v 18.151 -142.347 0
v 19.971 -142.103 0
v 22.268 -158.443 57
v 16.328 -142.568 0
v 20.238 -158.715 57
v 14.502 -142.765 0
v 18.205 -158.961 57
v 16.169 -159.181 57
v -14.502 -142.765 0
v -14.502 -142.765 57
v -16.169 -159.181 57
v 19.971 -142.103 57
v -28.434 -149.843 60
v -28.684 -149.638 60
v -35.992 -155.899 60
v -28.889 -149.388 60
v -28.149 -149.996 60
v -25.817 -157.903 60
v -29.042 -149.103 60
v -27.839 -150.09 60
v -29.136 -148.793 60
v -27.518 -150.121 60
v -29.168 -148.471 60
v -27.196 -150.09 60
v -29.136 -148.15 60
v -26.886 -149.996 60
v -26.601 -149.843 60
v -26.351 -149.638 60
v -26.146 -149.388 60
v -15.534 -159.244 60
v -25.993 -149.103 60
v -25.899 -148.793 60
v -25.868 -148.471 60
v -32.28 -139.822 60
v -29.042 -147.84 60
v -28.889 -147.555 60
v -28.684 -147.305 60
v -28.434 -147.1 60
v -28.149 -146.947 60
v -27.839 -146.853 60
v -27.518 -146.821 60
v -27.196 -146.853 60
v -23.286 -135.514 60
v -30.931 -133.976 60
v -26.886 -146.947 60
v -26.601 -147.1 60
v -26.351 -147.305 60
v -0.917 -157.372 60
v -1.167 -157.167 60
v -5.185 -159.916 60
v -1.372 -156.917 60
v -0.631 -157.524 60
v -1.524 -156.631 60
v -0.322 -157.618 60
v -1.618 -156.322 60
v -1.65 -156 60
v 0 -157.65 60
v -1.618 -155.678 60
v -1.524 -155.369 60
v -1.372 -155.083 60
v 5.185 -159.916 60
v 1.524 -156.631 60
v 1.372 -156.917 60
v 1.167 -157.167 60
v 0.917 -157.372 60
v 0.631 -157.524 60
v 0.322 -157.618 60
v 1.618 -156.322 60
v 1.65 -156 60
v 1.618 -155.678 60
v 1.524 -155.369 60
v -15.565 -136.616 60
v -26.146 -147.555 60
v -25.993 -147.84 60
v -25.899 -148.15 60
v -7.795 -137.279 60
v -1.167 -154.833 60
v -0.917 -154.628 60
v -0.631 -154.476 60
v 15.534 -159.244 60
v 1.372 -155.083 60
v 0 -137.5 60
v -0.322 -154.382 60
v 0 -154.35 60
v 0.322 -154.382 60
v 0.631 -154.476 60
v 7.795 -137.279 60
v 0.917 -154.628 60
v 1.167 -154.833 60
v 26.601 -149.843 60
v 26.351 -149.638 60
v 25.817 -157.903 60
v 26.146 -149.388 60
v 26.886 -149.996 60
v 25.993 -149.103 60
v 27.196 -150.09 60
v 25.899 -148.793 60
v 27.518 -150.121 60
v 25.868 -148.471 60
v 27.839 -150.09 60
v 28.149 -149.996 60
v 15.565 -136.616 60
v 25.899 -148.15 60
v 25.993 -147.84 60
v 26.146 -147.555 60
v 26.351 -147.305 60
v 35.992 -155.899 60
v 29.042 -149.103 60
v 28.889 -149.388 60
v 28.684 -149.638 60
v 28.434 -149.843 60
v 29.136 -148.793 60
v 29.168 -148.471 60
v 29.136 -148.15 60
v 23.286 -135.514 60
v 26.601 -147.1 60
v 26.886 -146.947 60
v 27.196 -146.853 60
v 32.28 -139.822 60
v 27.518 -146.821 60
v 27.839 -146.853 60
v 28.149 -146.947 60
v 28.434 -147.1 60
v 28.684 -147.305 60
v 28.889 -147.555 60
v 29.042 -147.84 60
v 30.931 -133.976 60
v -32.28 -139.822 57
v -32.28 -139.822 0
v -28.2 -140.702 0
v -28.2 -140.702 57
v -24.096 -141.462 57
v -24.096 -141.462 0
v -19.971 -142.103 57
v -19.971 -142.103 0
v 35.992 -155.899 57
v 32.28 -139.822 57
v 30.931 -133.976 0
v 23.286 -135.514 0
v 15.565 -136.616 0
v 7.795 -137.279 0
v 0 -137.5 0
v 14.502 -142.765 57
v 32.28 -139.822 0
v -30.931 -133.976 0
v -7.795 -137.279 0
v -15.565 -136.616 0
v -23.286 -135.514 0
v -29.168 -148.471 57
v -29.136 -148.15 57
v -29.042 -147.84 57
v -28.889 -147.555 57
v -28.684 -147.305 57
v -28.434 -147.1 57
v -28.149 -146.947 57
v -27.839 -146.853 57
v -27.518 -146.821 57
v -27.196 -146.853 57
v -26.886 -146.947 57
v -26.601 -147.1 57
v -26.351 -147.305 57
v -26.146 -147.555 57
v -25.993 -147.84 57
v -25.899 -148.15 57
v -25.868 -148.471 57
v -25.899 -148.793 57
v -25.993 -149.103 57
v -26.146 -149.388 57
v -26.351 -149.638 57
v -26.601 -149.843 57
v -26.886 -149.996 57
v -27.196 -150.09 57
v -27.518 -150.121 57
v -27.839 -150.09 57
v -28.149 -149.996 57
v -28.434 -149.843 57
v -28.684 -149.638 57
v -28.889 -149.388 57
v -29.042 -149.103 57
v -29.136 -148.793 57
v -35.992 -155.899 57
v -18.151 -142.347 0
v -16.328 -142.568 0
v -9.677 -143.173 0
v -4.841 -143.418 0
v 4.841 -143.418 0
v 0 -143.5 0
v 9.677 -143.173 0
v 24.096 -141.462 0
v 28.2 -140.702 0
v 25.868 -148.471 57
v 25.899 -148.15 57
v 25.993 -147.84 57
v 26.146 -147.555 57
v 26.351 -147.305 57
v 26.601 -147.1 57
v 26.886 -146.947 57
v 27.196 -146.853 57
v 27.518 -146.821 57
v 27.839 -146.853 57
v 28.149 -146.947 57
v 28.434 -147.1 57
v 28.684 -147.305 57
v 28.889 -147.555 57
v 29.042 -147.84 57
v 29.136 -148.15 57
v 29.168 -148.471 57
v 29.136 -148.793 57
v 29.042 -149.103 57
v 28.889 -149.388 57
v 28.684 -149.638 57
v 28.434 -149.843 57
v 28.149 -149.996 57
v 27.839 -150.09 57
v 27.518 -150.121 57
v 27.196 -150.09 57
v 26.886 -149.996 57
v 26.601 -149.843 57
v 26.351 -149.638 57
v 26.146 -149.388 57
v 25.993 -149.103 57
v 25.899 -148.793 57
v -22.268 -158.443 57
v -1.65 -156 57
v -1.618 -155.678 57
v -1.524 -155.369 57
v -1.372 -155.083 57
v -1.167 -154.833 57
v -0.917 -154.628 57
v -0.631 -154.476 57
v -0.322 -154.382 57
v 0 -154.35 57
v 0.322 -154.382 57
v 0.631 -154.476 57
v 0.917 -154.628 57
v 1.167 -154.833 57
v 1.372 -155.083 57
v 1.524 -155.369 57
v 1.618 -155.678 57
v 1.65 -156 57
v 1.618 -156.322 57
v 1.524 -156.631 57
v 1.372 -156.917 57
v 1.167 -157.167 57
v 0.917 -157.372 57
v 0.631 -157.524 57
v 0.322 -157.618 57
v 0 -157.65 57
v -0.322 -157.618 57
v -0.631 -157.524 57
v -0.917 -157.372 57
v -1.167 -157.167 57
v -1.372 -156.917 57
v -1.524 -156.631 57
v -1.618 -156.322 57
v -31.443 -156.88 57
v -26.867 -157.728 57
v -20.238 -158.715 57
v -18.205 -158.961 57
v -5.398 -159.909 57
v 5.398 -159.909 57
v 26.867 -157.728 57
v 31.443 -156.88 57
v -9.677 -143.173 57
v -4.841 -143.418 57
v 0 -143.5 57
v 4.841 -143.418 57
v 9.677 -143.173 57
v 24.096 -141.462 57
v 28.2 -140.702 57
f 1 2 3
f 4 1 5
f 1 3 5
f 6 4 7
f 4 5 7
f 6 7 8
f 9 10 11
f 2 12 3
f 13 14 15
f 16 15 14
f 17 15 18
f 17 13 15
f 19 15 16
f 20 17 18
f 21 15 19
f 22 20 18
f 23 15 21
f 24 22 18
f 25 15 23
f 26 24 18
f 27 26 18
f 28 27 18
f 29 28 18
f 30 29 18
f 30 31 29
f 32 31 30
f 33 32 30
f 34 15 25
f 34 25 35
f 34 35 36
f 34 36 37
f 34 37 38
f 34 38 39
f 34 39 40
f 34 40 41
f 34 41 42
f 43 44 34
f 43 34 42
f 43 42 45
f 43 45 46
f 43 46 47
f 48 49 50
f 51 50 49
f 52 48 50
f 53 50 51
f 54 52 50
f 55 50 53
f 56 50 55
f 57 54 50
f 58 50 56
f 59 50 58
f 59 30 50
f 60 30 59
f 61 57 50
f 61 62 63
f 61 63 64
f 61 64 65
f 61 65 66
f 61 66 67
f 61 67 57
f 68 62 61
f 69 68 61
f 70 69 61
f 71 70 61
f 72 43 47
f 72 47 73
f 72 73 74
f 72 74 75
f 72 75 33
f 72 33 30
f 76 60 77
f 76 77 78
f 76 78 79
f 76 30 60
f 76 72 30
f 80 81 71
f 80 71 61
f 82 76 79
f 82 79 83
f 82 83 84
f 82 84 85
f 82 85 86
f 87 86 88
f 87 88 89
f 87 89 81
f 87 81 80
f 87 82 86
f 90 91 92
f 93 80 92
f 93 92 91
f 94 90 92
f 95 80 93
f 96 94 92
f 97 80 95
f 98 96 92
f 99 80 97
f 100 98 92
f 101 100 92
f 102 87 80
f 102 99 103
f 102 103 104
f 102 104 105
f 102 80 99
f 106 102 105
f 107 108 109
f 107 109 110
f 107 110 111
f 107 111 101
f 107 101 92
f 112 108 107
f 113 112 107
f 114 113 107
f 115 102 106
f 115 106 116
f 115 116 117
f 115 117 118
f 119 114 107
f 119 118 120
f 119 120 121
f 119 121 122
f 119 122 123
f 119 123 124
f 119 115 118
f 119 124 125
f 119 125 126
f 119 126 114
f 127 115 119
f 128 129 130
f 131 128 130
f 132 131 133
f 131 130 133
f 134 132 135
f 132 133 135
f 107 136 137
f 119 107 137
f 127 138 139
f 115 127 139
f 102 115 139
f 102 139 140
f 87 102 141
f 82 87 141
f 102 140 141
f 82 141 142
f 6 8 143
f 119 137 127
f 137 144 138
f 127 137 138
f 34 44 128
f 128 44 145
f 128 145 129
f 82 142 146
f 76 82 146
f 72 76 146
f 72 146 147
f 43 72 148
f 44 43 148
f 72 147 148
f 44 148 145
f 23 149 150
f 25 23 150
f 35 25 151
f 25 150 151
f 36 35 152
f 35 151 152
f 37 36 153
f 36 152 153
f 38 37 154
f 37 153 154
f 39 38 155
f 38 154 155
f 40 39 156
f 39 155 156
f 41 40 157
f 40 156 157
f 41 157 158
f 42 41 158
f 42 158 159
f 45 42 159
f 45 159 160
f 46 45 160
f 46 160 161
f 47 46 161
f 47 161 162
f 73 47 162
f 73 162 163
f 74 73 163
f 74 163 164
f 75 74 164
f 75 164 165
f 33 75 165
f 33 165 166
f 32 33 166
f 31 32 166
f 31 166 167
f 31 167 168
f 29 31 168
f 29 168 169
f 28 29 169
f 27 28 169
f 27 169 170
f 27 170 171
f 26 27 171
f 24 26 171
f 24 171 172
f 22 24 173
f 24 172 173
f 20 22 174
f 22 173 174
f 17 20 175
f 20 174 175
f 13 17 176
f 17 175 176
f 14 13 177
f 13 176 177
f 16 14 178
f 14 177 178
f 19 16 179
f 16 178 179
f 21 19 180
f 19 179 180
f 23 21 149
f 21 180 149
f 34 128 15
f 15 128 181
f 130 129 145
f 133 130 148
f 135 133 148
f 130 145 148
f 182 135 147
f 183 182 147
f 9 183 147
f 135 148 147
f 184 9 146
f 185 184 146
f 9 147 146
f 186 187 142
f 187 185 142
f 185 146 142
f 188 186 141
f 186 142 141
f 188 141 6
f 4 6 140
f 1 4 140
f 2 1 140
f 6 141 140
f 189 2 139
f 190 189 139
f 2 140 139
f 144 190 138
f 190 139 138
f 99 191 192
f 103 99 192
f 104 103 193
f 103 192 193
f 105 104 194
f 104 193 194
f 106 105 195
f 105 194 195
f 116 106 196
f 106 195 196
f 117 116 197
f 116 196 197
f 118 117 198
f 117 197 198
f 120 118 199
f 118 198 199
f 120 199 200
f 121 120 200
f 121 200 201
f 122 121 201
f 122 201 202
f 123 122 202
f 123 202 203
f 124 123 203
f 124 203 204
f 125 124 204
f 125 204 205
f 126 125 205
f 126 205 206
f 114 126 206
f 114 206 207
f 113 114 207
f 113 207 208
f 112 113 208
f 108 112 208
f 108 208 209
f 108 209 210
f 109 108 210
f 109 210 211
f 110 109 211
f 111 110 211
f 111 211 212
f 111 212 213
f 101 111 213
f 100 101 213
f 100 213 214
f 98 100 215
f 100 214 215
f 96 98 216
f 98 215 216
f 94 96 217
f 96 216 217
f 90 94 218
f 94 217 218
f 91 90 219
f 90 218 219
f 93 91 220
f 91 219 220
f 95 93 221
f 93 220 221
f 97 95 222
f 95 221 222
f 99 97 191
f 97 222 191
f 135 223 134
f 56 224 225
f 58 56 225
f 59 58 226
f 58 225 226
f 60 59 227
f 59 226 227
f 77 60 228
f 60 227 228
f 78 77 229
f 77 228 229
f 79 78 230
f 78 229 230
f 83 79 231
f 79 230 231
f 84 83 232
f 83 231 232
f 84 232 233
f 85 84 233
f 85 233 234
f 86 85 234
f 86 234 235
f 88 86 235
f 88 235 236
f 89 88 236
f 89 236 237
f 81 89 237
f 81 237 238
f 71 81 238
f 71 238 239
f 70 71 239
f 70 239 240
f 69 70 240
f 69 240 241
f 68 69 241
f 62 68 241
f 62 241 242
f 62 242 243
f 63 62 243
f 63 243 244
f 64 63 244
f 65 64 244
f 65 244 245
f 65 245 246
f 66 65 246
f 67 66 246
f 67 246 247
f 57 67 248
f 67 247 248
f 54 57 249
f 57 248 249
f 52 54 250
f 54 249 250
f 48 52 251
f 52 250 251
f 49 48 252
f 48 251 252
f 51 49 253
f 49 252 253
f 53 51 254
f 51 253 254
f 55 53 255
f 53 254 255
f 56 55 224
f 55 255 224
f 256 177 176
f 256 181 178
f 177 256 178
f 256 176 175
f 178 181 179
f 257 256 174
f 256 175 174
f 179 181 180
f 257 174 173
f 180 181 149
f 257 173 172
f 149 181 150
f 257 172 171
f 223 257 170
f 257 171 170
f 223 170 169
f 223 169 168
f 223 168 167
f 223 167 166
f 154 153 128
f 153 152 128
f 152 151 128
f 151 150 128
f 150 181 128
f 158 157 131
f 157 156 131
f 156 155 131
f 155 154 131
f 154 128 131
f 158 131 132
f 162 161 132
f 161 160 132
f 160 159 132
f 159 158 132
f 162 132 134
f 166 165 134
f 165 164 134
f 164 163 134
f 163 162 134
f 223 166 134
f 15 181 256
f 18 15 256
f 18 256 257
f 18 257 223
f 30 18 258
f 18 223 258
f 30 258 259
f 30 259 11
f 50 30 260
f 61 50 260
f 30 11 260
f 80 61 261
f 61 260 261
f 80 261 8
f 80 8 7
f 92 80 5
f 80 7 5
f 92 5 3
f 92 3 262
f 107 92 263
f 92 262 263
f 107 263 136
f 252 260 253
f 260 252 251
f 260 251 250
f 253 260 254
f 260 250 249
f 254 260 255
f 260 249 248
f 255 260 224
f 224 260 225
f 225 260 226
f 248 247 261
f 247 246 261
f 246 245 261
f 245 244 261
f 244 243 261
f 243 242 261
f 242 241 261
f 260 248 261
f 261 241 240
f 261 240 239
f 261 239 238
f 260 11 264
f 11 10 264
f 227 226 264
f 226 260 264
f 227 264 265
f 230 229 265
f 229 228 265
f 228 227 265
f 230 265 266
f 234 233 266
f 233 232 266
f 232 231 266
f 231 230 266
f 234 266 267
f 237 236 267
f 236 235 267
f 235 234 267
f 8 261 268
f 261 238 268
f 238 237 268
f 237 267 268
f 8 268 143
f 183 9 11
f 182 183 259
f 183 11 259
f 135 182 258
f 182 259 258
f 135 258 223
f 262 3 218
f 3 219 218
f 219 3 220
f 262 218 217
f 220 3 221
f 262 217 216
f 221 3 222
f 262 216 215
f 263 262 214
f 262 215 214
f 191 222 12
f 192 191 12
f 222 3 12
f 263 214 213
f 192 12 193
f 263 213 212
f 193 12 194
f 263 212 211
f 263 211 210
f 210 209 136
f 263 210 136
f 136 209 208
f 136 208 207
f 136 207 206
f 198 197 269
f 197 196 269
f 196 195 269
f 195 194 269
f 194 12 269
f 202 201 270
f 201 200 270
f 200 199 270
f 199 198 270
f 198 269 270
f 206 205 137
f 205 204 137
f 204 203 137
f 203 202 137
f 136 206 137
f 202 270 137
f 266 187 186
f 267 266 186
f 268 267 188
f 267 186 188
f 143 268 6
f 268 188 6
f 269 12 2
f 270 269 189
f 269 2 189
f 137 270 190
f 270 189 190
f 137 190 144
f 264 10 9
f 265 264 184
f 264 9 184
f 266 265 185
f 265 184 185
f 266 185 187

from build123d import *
from build123d.topology import SkipClean

# Parameters (mm, degrees)
EXTRUDE_1_DEPTH     = 60
EXTRUDE_START       = -3
EXTRUDE_2_DEPTH     = 3
EXTRUDE_START_2     = 57
SKETCH_3_R          = 1.65
EXTRUDE_3_DEPTH     = 57
SKETCH_4_R          = 1.65
CUT_EXTRUDE_1_DEPTH = 175.629425377


with BuildPart() as part:
    # 草图1 → 凸台-拉伸1 (new body)
    with BuildSketch(Plane.XY):
        with BuildLine():
            ThreePointArc((0, -143.5), (16.244661176, -142.57756129), (32.280476298, -139.822104297))
            Line((32.280476298, -139.822104297), (30.930769972, -133.975883908))
            ThreePointArc((30.930769972, -133.975883908), (15.565441893, -136.616130156), (0, -137.5))
            Line((0, -137.5), (0, -143.5))
        make_face()
        with BuildLine():
            Line((-30.930769972, -133.975883908), (-32.280476298, -139.822104297))
            ThreePointArc((-32.280476298, -139.822104297), (-16.244661176, -142.57756129), (0, -143.5))
            Line((0, -143.5), (0, -137.5))
            ThreePointArc((0, -137.5), (-15.565441893, -136.616130156), (-30.930769972, -133.975883908))
        make_face()
    extrude(amount=EXTRUDE_1_DEPTH)

    # 草图2 → 凸台-拉伸2 (add)
    with BuildSketch(Plane.XY.offset(60).offset(EXTRUDE_START)):
        with BuildLine():
            Line((35.992168695, -155.899210366), (32.280476298, -139.822104297))
            ThreePointArc((32.280476298, -139.822104297), (0, -143.5), (-32.280476298, -139.822104297))
            Line((-32.280476298, -139.822104297), (-35.992168695, -155.899210366))
            ThreePointArc((-35.992168695, -155.899210366), (0, -160), (35.992168695, -155.899210366))
        make_face()
    extrude(amount=EXTRUDE_2_DEPTH)

    # 草图3 → 凸台-拉伸3 (add)
    with SkipClean():  # the faces are left unmerged after this step: merging them gives an invalid solid
        with BuildSketch(Plane(origin=(0, 0, 57), x_dir=(-1, 0, 0), z_dir=(0, 0, -1)).offset(EXTRUDE_START_2)):
            with Locations(Location((-27.517564349, -148.471491042, 0), (0, 0, 180))):
                Circle(SKETCH_3_R)
            with Locations(Location((0, -156, 0), (0, 0, 180))):
                Circle(SKETCH_3_R)
            with BuildLine():
                Line((-16.169007549, -159.180913413), (-14.501578646, -142.765381717))
                ThreePointArc((-14.501578646, -142.765381717), (-17.239636373, -142.460678567), (-19.971339988, -142.103467864))
                Line((-19.971339988, -142.103467864), (-22.267696154, -158.442890999))
                ThreePointArc((-22.267696154, -158.442890999), (-19.221894214, -158.841174709), (-16.169007549, -159.180913413))
            make_face()
            with BuildLine():
                ThreePointArc((19.971339988, -142.103467864), (17.239636373, -142.460678567), (14.501578646, -142.765381717))
                Line((14.501578646, -142.765381717), (16.169007549, -159.180913413))
                ThreePointArc((16.169007549, -159.180913413), (19.221894214, -158.841174709), (22.267696154, -158.442890999))
                Line((22.267696154, -158.442890999), (19.971339988, -142.103467864))
            make_face()
            with Locations(Location((27.517564349, -148.471491042, 0), (0, 0, 180))):
                Circle(SKETCH_3_R)
        extrude(amount=-EXTRUDE_3_DEPTH)

    # 草图4 → 切除-拉伸1 (cut, through all)
    with SkipClean():  # the faces are left unmerged after this step: merging them gives an invalid solid
        with BuildSketch(Plane(origin=(0, 0, 0), x_dir=(-1, 0, 0), z_dir=(0, 0, -1))):
            with Locations((-27.517564349, -148.471491042)):
                Circle(SKETCH_4_R)
            with Locations((0, -156)):
                Circle(SKETCH_4_R)
            with Locations((27.517564349, -148.471491042)):
                Circle(SKETCH_4_R)
        extrude(amount=-CUT_EXTRUDE_1_DEPTH, mode=Mode.SUBTRACT)

    # 草图6 → 切除-旋转1 (revolve, cut)
    with BuildSketch(Plane(origin=(0, 0, 0), x_dir=(0, 0, -1), z_dir=(0.9902680687415703, 0.13917310096006566, 0))):
        Polygon((0, -143.5), (-57, -160), (0, -160), align=None)
    revolve(axis=Axis((0, 0, 60), (0, 0, -1)), mode=Mode.SUBTRACT)


solid = part.part
